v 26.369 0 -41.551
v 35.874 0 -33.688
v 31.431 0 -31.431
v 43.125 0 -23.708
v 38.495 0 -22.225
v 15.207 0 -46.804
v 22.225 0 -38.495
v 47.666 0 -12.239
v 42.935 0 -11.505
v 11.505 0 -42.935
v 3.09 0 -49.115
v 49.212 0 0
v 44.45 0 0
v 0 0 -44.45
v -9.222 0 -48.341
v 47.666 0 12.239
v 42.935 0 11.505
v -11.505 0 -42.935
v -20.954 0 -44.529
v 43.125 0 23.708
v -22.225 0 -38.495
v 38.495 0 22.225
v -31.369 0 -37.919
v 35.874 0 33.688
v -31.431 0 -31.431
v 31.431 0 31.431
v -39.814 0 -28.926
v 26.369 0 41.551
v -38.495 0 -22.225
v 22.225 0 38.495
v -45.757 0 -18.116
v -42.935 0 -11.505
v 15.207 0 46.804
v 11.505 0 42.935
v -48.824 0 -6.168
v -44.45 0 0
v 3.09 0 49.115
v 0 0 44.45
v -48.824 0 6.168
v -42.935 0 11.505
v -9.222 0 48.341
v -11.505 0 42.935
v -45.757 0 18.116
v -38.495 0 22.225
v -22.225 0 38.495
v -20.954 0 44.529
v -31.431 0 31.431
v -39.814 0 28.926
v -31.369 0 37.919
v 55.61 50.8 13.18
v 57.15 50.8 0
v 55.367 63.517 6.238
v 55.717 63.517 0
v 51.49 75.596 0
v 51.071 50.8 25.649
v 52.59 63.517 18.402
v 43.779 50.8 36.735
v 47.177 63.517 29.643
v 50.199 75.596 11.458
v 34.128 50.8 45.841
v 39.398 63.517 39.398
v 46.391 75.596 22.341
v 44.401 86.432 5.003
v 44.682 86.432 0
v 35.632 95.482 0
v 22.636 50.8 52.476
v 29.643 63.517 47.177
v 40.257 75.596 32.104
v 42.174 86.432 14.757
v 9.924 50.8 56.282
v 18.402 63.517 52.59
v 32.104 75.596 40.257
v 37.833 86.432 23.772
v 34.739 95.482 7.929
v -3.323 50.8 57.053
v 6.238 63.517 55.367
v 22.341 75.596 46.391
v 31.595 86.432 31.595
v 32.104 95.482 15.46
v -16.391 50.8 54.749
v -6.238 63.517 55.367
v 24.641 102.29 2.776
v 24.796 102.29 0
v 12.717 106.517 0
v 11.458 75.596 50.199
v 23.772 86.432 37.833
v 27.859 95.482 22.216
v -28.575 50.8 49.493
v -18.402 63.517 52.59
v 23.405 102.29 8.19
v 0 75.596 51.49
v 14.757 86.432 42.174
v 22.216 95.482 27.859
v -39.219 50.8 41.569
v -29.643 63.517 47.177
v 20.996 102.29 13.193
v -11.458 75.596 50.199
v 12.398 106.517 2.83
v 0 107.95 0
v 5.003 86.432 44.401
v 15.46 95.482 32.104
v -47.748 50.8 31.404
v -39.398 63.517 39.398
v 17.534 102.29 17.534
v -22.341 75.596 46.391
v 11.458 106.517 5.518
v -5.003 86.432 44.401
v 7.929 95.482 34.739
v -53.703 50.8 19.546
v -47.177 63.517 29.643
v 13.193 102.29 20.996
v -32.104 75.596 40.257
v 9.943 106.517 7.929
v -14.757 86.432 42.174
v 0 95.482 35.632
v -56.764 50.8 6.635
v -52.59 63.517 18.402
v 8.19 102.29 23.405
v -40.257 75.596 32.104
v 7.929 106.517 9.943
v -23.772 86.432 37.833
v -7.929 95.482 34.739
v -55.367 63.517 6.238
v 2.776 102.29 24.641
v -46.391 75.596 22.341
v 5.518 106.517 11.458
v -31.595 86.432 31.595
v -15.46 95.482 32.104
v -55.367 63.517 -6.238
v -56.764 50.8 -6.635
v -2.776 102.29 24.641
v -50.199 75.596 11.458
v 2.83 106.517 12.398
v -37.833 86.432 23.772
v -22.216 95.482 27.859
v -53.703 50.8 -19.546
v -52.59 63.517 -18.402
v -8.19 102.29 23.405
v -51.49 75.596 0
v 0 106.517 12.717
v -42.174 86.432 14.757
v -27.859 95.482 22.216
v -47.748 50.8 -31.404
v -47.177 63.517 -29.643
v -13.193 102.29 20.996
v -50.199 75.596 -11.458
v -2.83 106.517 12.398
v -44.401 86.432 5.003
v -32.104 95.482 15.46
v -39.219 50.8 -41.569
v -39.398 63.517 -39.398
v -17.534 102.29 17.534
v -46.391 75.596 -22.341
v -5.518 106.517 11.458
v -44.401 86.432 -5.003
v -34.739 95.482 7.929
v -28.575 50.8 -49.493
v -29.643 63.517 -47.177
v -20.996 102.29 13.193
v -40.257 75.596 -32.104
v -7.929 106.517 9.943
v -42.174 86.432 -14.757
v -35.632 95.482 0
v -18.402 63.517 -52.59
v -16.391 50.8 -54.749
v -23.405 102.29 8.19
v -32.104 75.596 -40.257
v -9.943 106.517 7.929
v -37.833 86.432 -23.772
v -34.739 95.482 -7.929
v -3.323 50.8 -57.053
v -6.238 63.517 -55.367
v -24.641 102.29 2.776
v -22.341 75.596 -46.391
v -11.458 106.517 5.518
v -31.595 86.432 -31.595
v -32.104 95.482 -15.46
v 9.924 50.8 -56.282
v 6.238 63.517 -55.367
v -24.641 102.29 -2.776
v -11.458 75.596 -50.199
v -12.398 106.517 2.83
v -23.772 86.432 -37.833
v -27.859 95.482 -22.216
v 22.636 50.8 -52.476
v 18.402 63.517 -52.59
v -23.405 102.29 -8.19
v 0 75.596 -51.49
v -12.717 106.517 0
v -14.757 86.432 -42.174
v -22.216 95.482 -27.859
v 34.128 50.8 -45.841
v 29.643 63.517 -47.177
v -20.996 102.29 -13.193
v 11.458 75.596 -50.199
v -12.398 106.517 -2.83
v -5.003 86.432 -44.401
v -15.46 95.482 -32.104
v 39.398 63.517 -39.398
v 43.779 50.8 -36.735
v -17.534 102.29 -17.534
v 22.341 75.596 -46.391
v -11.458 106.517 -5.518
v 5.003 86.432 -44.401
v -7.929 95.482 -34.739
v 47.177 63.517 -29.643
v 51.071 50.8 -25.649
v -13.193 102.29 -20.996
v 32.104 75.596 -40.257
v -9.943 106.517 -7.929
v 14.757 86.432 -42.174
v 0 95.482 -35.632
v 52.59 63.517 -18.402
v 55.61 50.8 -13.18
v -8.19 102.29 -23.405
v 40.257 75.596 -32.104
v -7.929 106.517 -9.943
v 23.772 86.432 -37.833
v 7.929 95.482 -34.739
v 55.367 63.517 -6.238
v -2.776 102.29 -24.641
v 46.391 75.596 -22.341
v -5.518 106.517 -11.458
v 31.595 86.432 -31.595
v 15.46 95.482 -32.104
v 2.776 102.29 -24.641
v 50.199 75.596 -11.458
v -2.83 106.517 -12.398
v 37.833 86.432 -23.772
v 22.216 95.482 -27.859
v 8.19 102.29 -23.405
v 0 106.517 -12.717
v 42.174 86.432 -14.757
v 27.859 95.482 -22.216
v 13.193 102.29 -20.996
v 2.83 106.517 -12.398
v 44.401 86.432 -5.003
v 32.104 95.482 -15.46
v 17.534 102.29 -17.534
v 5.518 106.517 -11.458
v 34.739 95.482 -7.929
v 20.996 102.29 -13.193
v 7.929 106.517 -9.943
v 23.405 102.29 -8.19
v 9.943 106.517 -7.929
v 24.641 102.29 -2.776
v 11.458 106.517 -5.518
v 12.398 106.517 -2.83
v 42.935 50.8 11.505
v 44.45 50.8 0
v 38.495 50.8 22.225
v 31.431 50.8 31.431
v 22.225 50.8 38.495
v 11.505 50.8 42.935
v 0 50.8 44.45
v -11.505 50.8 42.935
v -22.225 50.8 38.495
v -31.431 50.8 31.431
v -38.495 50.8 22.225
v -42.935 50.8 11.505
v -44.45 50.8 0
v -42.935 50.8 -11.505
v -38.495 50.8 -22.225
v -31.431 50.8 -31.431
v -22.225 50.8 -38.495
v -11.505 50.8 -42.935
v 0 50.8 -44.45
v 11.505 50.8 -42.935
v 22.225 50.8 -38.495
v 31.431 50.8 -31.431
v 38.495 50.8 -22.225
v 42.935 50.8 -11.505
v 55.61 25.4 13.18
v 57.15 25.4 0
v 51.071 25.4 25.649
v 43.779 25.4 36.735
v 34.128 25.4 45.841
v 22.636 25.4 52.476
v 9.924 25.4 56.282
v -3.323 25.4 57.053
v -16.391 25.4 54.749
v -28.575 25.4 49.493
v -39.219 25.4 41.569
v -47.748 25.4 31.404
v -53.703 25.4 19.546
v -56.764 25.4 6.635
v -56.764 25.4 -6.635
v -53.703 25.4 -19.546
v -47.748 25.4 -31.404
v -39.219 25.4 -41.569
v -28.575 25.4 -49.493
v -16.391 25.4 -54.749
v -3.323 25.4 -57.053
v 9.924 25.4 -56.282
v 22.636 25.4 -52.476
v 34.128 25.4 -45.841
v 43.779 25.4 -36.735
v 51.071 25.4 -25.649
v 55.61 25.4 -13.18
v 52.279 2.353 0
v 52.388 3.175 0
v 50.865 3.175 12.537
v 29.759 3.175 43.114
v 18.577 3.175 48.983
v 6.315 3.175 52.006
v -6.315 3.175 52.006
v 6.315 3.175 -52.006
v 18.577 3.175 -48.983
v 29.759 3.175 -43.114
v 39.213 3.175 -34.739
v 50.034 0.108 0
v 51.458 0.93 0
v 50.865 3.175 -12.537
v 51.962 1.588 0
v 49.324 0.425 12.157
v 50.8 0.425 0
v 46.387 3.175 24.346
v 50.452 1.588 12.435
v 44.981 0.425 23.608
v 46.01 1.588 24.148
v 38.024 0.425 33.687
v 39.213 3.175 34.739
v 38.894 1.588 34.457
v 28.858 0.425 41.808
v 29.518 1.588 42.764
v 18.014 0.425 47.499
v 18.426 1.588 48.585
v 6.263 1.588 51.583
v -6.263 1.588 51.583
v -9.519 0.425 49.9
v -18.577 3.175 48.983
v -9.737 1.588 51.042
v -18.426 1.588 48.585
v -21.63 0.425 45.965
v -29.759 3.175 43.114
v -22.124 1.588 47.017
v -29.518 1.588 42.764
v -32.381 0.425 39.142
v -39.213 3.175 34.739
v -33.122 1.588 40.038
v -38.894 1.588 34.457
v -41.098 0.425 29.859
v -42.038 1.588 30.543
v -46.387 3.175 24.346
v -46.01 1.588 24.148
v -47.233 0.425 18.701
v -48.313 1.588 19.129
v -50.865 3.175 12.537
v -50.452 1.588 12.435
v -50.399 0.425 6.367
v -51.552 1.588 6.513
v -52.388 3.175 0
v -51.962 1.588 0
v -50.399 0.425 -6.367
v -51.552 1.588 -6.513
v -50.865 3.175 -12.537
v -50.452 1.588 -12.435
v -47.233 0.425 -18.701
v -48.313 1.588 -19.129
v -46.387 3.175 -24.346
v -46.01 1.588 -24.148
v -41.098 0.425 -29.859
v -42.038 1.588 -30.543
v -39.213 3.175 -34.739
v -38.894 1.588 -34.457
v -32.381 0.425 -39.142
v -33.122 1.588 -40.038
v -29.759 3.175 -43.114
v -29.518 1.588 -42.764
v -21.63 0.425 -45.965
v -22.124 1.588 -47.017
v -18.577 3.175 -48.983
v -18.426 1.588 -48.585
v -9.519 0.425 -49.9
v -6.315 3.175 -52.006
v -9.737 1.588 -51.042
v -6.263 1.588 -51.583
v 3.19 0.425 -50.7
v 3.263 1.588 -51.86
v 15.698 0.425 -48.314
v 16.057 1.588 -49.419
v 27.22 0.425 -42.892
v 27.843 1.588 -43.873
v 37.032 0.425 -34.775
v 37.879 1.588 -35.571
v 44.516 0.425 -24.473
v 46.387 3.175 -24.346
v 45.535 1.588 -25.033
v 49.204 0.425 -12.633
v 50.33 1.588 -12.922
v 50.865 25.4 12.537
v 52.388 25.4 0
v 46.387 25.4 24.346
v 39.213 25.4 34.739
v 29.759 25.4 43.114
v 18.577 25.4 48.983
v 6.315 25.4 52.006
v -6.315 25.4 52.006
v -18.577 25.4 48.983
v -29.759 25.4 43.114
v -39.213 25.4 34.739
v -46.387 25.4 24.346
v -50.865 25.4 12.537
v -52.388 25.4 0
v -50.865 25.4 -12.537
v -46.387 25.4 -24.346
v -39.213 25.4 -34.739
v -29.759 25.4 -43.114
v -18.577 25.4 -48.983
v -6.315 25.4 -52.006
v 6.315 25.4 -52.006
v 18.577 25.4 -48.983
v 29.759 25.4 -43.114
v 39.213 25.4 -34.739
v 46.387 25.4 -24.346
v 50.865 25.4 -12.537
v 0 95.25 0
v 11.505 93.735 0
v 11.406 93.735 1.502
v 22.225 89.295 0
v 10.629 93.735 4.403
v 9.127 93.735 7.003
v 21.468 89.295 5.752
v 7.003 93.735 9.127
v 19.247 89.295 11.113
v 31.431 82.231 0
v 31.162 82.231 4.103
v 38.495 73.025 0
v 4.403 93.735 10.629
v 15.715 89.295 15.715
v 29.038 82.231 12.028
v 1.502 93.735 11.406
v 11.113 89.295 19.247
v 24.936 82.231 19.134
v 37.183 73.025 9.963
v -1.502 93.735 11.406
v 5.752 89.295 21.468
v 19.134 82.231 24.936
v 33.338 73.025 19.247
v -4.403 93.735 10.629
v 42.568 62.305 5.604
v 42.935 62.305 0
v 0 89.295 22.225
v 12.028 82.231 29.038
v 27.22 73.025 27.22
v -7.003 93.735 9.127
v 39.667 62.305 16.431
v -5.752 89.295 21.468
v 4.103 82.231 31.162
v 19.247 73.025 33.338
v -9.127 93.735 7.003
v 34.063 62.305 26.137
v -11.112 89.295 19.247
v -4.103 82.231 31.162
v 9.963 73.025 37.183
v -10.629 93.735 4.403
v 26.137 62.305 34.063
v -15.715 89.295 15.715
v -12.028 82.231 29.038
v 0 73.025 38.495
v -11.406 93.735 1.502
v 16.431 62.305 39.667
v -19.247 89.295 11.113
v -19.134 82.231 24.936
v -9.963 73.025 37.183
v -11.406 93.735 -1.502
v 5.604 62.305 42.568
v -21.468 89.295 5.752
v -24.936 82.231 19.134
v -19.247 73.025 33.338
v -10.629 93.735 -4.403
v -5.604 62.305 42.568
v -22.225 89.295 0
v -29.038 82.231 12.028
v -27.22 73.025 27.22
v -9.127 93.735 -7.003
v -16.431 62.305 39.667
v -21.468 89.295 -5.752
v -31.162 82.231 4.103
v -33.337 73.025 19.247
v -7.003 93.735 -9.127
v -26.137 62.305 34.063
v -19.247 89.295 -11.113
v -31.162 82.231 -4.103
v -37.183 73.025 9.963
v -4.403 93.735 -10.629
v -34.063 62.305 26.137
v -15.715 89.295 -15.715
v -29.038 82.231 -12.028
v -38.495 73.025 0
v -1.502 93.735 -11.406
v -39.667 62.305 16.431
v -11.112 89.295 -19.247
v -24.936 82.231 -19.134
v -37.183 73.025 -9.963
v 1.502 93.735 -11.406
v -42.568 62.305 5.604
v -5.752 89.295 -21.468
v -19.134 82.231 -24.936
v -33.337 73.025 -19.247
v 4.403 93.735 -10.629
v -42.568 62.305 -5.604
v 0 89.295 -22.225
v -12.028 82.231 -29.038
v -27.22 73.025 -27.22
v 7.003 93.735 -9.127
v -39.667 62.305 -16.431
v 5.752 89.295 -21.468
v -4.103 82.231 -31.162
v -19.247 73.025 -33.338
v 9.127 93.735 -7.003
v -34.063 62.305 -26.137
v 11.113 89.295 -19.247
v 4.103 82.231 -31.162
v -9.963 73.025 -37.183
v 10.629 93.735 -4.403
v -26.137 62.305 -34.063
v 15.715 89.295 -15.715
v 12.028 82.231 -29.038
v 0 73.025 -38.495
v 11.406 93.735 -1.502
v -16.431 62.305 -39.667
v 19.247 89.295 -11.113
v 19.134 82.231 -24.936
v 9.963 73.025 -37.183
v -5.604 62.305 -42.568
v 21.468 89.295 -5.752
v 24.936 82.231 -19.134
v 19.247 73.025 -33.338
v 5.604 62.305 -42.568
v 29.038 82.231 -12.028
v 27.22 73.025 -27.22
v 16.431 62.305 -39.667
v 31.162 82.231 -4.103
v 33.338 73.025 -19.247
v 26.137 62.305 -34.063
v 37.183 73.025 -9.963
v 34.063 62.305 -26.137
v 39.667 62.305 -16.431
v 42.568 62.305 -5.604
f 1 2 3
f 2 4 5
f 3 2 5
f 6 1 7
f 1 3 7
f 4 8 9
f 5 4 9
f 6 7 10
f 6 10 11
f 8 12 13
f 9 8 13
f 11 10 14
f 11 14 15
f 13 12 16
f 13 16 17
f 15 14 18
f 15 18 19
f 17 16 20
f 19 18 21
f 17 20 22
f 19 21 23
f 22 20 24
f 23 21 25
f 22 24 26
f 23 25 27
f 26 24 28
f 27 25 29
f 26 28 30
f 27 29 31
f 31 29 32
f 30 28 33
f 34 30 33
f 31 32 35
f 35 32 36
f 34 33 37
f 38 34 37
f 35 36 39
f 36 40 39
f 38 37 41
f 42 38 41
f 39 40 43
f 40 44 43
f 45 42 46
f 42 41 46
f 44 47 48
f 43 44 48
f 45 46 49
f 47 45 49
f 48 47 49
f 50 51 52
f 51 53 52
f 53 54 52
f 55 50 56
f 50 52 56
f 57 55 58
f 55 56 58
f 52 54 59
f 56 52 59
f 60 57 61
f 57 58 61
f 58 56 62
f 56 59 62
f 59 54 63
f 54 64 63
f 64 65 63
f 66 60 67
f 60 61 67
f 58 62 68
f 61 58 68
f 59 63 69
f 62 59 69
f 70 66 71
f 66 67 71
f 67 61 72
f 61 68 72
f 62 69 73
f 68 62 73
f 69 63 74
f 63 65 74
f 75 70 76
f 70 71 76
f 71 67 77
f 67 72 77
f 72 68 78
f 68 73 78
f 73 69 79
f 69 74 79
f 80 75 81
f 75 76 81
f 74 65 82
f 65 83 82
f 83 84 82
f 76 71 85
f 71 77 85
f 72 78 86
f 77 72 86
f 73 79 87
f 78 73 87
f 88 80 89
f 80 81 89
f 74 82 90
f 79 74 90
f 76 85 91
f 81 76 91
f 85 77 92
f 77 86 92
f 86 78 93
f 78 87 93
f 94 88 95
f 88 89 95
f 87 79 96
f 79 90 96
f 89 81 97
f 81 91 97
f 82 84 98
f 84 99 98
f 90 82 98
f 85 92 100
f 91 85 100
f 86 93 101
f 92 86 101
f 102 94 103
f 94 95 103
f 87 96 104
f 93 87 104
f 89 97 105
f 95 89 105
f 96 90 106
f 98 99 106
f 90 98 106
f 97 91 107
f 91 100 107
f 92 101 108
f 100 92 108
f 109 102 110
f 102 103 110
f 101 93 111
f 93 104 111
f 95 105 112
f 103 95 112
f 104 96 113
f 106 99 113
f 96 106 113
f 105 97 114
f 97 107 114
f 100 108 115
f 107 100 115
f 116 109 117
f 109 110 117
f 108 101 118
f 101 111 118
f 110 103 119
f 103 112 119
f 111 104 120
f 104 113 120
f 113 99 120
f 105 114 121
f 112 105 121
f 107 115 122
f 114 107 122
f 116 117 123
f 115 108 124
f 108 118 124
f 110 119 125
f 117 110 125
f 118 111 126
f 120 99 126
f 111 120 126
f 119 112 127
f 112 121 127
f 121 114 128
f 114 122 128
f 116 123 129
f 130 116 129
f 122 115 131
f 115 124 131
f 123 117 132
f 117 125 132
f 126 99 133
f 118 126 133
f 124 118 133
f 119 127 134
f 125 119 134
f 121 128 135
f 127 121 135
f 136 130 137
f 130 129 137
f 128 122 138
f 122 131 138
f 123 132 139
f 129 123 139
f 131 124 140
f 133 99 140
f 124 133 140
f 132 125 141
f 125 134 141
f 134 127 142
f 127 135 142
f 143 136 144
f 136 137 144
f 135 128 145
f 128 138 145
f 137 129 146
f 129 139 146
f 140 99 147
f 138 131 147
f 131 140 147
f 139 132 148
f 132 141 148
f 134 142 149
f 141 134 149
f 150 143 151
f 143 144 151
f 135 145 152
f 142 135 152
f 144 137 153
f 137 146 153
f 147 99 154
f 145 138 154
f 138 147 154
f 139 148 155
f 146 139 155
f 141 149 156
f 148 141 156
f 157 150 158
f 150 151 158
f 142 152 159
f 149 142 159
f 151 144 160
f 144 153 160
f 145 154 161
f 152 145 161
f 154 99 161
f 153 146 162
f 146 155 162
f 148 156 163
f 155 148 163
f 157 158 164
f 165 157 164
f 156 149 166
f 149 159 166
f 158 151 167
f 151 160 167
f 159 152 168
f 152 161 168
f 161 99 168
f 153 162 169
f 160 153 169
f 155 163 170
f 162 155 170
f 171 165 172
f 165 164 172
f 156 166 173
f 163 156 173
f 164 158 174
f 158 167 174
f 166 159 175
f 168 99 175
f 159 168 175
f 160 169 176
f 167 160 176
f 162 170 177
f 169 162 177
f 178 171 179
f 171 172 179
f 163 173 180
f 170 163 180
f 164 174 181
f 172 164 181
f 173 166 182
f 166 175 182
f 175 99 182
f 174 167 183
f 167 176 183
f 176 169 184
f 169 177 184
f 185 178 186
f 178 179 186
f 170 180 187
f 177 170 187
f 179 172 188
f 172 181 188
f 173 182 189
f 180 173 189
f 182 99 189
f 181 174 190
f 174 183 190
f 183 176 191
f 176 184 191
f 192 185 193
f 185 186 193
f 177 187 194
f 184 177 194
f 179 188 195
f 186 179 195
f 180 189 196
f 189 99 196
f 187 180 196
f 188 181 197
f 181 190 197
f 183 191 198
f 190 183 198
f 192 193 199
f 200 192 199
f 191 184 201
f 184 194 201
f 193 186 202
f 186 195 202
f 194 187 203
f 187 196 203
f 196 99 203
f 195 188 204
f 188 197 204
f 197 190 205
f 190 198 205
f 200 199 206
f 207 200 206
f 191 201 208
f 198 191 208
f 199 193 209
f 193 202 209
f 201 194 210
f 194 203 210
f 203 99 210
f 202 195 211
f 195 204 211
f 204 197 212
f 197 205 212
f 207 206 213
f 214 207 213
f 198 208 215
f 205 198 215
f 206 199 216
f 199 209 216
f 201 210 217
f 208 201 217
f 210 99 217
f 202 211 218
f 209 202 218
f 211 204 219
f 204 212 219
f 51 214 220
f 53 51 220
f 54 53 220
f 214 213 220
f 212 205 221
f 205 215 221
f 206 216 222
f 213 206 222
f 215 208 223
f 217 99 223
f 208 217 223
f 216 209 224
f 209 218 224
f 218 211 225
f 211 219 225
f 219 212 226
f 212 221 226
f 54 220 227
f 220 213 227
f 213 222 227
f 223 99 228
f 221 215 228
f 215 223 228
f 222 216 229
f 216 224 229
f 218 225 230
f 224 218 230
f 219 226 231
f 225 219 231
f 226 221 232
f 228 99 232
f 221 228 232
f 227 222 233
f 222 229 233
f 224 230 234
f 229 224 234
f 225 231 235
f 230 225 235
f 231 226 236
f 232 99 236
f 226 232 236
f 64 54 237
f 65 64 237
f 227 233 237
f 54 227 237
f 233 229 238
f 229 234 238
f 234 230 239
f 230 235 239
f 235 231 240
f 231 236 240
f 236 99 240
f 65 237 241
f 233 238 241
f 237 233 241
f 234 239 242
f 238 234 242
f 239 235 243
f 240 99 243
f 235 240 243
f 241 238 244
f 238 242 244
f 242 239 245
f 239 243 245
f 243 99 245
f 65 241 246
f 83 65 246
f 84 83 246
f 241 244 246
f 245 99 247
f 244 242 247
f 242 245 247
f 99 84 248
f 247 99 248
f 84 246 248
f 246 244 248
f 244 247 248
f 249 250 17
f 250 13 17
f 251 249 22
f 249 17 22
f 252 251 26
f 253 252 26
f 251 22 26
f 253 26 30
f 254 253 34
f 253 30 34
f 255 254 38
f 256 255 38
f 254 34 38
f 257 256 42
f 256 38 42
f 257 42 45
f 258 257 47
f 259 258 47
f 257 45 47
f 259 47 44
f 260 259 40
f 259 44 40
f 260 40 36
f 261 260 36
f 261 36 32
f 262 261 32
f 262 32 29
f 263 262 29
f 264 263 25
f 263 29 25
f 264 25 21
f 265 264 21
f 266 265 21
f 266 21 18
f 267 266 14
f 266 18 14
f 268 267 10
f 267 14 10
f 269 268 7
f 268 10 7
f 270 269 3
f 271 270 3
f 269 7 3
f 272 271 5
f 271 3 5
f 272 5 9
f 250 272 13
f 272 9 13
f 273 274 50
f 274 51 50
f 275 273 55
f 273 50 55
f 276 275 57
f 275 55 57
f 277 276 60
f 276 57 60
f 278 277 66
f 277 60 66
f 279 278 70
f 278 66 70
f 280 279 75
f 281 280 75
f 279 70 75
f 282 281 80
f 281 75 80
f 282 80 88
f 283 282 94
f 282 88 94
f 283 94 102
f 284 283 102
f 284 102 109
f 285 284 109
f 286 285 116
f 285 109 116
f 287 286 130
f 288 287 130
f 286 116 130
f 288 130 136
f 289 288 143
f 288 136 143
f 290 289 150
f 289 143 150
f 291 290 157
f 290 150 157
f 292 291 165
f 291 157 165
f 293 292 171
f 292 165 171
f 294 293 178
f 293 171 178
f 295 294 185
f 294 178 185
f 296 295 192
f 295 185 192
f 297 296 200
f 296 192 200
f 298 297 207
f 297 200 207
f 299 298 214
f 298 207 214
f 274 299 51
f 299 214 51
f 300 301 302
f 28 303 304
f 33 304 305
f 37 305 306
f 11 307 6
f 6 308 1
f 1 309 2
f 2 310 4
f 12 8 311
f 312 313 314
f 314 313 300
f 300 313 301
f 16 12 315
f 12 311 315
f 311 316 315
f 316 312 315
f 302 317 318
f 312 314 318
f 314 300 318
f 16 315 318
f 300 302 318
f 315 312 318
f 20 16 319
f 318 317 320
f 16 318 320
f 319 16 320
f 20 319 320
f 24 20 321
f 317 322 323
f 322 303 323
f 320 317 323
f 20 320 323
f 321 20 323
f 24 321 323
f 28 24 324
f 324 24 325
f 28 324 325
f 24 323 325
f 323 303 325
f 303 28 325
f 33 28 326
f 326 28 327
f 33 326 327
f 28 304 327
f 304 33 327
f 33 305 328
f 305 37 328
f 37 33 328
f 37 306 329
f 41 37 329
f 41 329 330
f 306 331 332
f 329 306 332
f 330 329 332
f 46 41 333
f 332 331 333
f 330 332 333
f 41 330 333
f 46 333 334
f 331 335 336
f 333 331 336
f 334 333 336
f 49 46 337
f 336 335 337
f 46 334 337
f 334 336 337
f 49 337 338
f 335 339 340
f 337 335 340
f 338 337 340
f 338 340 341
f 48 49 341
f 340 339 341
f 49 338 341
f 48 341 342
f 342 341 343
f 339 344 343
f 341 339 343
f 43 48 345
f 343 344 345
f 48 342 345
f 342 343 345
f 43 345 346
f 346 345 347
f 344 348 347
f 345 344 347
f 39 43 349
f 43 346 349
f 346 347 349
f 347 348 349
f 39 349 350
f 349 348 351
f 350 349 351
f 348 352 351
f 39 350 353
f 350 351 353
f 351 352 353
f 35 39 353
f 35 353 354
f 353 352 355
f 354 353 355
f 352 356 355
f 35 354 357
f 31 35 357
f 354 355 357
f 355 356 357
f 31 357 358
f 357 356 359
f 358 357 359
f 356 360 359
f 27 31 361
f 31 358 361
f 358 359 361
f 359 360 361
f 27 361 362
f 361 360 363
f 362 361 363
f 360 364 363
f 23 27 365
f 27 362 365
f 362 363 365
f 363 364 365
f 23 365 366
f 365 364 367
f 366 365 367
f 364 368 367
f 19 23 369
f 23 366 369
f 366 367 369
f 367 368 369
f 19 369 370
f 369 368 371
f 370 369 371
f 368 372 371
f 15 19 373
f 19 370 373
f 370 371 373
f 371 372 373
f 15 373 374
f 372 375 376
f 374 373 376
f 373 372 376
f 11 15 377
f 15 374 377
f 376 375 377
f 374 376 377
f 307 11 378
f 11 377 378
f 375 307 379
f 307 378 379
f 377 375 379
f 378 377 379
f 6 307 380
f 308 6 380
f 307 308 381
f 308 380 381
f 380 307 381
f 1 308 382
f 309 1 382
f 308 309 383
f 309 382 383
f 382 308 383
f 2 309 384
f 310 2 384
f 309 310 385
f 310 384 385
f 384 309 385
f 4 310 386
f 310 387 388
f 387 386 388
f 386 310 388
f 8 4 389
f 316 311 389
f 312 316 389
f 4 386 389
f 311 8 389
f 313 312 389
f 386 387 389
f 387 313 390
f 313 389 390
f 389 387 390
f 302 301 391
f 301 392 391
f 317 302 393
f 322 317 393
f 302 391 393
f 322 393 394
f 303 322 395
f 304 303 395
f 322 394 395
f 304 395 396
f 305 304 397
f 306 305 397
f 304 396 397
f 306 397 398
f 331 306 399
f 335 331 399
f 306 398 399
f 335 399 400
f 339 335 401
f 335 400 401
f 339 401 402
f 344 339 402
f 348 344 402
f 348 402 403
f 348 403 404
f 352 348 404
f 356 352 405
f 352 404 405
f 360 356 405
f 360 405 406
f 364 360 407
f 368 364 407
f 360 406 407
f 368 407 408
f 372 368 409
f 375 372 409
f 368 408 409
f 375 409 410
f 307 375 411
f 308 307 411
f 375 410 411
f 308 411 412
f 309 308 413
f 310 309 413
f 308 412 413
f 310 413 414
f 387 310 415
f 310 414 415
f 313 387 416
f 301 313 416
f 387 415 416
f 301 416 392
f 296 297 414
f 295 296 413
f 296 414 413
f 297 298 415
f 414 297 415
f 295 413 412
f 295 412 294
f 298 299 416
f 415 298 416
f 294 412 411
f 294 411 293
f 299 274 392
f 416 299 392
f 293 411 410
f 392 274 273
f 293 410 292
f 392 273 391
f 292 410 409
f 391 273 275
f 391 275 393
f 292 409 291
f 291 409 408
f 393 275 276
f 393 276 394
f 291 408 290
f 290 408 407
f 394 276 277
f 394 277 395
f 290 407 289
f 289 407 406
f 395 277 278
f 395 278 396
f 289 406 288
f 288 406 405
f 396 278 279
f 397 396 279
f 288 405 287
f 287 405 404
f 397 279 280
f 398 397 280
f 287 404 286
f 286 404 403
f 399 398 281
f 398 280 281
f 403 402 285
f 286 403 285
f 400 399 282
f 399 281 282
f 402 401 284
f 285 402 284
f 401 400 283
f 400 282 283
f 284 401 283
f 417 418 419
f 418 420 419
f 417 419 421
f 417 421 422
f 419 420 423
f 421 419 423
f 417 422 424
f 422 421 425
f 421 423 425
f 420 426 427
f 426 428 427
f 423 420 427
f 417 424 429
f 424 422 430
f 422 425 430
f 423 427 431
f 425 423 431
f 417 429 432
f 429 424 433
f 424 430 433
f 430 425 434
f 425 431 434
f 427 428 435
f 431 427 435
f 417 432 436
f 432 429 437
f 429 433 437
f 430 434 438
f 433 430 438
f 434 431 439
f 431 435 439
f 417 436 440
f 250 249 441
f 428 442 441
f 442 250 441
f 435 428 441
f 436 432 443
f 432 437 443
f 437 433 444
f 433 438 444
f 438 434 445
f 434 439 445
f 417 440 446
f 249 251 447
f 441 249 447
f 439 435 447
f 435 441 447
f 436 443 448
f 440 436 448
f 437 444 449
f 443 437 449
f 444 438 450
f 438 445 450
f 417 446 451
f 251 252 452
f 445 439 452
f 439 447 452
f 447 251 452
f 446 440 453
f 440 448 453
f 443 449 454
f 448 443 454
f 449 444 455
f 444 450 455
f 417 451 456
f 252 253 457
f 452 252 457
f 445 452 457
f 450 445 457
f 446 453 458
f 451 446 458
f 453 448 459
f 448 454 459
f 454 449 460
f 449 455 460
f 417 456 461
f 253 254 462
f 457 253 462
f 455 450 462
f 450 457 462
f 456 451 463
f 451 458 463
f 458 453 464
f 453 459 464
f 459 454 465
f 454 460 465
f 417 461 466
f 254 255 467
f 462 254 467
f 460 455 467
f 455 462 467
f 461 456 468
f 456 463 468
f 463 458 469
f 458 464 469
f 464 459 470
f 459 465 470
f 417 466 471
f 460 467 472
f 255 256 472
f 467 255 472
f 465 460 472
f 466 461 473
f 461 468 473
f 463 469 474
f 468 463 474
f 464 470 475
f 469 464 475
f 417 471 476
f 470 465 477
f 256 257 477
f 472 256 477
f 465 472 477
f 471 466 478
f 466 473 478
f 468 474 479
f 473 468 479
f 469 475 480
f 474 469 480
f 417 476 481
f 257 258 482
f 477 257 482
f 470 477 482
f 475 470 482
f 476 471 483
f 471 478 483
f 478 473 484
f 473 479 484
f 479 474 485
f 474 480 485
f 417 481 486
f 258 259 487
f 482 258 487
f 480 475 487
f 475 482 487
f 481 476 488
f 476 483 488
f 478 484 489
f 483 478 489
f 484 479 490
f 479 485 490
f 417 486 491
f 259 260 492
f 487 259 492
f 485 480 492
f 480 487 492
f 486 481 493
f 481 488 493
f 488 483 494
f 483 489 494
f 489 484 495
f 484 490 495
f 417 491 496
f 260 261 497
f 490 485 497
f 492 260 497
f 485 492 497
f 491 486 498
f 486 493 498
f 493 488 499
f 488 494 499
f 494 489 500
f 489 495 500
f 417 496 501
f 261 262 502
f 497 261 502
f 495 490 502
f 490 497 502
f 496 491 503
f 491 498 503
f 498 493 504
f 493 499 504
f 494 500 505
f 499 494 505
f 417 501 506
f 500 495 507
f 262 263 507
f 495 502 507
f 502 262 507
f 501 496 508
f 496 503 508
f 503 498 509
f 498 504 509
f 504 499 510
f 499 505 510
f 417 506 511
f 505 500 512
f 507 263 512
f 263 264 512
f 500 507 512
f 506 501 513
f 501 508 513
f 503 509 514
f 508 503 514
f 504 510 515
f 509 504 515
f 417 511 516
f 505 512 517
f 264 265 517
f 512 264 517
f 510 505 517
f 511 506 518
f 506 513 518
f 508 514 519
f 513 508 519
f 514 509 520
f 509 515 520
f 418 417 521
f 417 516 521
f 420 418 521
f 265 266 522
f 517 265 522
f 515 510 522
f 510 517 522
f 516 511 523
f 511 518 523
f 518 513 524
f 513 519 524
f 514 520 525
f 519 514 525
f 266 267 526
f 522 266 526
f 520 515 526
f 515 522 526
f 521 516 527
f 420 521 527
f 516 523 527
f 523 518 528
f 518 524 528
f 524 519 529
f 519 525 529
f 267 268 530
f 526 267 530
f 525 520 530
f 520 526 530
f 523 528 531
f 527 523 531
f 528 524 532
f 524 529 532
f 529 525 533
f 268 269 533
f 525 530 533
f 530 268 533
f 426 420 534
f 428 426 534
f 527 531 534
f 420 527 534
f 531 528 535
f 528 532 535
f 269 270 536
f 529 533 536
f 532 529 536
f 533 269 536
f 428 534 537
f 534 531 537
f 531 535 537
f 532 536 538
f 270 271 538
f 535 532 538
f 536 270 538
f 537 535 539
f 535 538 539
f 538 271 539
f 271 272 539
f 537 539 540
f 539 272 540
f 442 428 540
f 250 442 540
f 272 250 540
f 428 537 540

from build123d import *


with BuildPart() as part:
    # Sketch2 → Revolve1 (revolve)
    with BuildSketch(Plane.XY):
        with BuildLine():
            Line((44.45, 0), (49.2125, 0))
            ThreePointArc((49.2125, 0), (51.45756403, 0.92993597), (52.3875, 3.175))
            Line((52.3875, 3.175), (52.3875, 25.4))
            Line((52.3875, 25.4), (57.15, 25.4))
            Line((57.15, 25.4), (57.15, 50.8))
            ThreePointArc((57.15, 50.8), (40.411152545, 91.211152545), (0, 107.95))
            Line((0, 107.95), (0, 95.25))
            ThreePointArc((0, 95.25), (31.430896424, 82.230896424), (44.45, 50.8))
            Line((44.45, 50.8), (44.45, 0))
        make_face()
    revolve(axis=Axis((0, 107.95, 0), (0, -1, 0)))


solid = part.part
